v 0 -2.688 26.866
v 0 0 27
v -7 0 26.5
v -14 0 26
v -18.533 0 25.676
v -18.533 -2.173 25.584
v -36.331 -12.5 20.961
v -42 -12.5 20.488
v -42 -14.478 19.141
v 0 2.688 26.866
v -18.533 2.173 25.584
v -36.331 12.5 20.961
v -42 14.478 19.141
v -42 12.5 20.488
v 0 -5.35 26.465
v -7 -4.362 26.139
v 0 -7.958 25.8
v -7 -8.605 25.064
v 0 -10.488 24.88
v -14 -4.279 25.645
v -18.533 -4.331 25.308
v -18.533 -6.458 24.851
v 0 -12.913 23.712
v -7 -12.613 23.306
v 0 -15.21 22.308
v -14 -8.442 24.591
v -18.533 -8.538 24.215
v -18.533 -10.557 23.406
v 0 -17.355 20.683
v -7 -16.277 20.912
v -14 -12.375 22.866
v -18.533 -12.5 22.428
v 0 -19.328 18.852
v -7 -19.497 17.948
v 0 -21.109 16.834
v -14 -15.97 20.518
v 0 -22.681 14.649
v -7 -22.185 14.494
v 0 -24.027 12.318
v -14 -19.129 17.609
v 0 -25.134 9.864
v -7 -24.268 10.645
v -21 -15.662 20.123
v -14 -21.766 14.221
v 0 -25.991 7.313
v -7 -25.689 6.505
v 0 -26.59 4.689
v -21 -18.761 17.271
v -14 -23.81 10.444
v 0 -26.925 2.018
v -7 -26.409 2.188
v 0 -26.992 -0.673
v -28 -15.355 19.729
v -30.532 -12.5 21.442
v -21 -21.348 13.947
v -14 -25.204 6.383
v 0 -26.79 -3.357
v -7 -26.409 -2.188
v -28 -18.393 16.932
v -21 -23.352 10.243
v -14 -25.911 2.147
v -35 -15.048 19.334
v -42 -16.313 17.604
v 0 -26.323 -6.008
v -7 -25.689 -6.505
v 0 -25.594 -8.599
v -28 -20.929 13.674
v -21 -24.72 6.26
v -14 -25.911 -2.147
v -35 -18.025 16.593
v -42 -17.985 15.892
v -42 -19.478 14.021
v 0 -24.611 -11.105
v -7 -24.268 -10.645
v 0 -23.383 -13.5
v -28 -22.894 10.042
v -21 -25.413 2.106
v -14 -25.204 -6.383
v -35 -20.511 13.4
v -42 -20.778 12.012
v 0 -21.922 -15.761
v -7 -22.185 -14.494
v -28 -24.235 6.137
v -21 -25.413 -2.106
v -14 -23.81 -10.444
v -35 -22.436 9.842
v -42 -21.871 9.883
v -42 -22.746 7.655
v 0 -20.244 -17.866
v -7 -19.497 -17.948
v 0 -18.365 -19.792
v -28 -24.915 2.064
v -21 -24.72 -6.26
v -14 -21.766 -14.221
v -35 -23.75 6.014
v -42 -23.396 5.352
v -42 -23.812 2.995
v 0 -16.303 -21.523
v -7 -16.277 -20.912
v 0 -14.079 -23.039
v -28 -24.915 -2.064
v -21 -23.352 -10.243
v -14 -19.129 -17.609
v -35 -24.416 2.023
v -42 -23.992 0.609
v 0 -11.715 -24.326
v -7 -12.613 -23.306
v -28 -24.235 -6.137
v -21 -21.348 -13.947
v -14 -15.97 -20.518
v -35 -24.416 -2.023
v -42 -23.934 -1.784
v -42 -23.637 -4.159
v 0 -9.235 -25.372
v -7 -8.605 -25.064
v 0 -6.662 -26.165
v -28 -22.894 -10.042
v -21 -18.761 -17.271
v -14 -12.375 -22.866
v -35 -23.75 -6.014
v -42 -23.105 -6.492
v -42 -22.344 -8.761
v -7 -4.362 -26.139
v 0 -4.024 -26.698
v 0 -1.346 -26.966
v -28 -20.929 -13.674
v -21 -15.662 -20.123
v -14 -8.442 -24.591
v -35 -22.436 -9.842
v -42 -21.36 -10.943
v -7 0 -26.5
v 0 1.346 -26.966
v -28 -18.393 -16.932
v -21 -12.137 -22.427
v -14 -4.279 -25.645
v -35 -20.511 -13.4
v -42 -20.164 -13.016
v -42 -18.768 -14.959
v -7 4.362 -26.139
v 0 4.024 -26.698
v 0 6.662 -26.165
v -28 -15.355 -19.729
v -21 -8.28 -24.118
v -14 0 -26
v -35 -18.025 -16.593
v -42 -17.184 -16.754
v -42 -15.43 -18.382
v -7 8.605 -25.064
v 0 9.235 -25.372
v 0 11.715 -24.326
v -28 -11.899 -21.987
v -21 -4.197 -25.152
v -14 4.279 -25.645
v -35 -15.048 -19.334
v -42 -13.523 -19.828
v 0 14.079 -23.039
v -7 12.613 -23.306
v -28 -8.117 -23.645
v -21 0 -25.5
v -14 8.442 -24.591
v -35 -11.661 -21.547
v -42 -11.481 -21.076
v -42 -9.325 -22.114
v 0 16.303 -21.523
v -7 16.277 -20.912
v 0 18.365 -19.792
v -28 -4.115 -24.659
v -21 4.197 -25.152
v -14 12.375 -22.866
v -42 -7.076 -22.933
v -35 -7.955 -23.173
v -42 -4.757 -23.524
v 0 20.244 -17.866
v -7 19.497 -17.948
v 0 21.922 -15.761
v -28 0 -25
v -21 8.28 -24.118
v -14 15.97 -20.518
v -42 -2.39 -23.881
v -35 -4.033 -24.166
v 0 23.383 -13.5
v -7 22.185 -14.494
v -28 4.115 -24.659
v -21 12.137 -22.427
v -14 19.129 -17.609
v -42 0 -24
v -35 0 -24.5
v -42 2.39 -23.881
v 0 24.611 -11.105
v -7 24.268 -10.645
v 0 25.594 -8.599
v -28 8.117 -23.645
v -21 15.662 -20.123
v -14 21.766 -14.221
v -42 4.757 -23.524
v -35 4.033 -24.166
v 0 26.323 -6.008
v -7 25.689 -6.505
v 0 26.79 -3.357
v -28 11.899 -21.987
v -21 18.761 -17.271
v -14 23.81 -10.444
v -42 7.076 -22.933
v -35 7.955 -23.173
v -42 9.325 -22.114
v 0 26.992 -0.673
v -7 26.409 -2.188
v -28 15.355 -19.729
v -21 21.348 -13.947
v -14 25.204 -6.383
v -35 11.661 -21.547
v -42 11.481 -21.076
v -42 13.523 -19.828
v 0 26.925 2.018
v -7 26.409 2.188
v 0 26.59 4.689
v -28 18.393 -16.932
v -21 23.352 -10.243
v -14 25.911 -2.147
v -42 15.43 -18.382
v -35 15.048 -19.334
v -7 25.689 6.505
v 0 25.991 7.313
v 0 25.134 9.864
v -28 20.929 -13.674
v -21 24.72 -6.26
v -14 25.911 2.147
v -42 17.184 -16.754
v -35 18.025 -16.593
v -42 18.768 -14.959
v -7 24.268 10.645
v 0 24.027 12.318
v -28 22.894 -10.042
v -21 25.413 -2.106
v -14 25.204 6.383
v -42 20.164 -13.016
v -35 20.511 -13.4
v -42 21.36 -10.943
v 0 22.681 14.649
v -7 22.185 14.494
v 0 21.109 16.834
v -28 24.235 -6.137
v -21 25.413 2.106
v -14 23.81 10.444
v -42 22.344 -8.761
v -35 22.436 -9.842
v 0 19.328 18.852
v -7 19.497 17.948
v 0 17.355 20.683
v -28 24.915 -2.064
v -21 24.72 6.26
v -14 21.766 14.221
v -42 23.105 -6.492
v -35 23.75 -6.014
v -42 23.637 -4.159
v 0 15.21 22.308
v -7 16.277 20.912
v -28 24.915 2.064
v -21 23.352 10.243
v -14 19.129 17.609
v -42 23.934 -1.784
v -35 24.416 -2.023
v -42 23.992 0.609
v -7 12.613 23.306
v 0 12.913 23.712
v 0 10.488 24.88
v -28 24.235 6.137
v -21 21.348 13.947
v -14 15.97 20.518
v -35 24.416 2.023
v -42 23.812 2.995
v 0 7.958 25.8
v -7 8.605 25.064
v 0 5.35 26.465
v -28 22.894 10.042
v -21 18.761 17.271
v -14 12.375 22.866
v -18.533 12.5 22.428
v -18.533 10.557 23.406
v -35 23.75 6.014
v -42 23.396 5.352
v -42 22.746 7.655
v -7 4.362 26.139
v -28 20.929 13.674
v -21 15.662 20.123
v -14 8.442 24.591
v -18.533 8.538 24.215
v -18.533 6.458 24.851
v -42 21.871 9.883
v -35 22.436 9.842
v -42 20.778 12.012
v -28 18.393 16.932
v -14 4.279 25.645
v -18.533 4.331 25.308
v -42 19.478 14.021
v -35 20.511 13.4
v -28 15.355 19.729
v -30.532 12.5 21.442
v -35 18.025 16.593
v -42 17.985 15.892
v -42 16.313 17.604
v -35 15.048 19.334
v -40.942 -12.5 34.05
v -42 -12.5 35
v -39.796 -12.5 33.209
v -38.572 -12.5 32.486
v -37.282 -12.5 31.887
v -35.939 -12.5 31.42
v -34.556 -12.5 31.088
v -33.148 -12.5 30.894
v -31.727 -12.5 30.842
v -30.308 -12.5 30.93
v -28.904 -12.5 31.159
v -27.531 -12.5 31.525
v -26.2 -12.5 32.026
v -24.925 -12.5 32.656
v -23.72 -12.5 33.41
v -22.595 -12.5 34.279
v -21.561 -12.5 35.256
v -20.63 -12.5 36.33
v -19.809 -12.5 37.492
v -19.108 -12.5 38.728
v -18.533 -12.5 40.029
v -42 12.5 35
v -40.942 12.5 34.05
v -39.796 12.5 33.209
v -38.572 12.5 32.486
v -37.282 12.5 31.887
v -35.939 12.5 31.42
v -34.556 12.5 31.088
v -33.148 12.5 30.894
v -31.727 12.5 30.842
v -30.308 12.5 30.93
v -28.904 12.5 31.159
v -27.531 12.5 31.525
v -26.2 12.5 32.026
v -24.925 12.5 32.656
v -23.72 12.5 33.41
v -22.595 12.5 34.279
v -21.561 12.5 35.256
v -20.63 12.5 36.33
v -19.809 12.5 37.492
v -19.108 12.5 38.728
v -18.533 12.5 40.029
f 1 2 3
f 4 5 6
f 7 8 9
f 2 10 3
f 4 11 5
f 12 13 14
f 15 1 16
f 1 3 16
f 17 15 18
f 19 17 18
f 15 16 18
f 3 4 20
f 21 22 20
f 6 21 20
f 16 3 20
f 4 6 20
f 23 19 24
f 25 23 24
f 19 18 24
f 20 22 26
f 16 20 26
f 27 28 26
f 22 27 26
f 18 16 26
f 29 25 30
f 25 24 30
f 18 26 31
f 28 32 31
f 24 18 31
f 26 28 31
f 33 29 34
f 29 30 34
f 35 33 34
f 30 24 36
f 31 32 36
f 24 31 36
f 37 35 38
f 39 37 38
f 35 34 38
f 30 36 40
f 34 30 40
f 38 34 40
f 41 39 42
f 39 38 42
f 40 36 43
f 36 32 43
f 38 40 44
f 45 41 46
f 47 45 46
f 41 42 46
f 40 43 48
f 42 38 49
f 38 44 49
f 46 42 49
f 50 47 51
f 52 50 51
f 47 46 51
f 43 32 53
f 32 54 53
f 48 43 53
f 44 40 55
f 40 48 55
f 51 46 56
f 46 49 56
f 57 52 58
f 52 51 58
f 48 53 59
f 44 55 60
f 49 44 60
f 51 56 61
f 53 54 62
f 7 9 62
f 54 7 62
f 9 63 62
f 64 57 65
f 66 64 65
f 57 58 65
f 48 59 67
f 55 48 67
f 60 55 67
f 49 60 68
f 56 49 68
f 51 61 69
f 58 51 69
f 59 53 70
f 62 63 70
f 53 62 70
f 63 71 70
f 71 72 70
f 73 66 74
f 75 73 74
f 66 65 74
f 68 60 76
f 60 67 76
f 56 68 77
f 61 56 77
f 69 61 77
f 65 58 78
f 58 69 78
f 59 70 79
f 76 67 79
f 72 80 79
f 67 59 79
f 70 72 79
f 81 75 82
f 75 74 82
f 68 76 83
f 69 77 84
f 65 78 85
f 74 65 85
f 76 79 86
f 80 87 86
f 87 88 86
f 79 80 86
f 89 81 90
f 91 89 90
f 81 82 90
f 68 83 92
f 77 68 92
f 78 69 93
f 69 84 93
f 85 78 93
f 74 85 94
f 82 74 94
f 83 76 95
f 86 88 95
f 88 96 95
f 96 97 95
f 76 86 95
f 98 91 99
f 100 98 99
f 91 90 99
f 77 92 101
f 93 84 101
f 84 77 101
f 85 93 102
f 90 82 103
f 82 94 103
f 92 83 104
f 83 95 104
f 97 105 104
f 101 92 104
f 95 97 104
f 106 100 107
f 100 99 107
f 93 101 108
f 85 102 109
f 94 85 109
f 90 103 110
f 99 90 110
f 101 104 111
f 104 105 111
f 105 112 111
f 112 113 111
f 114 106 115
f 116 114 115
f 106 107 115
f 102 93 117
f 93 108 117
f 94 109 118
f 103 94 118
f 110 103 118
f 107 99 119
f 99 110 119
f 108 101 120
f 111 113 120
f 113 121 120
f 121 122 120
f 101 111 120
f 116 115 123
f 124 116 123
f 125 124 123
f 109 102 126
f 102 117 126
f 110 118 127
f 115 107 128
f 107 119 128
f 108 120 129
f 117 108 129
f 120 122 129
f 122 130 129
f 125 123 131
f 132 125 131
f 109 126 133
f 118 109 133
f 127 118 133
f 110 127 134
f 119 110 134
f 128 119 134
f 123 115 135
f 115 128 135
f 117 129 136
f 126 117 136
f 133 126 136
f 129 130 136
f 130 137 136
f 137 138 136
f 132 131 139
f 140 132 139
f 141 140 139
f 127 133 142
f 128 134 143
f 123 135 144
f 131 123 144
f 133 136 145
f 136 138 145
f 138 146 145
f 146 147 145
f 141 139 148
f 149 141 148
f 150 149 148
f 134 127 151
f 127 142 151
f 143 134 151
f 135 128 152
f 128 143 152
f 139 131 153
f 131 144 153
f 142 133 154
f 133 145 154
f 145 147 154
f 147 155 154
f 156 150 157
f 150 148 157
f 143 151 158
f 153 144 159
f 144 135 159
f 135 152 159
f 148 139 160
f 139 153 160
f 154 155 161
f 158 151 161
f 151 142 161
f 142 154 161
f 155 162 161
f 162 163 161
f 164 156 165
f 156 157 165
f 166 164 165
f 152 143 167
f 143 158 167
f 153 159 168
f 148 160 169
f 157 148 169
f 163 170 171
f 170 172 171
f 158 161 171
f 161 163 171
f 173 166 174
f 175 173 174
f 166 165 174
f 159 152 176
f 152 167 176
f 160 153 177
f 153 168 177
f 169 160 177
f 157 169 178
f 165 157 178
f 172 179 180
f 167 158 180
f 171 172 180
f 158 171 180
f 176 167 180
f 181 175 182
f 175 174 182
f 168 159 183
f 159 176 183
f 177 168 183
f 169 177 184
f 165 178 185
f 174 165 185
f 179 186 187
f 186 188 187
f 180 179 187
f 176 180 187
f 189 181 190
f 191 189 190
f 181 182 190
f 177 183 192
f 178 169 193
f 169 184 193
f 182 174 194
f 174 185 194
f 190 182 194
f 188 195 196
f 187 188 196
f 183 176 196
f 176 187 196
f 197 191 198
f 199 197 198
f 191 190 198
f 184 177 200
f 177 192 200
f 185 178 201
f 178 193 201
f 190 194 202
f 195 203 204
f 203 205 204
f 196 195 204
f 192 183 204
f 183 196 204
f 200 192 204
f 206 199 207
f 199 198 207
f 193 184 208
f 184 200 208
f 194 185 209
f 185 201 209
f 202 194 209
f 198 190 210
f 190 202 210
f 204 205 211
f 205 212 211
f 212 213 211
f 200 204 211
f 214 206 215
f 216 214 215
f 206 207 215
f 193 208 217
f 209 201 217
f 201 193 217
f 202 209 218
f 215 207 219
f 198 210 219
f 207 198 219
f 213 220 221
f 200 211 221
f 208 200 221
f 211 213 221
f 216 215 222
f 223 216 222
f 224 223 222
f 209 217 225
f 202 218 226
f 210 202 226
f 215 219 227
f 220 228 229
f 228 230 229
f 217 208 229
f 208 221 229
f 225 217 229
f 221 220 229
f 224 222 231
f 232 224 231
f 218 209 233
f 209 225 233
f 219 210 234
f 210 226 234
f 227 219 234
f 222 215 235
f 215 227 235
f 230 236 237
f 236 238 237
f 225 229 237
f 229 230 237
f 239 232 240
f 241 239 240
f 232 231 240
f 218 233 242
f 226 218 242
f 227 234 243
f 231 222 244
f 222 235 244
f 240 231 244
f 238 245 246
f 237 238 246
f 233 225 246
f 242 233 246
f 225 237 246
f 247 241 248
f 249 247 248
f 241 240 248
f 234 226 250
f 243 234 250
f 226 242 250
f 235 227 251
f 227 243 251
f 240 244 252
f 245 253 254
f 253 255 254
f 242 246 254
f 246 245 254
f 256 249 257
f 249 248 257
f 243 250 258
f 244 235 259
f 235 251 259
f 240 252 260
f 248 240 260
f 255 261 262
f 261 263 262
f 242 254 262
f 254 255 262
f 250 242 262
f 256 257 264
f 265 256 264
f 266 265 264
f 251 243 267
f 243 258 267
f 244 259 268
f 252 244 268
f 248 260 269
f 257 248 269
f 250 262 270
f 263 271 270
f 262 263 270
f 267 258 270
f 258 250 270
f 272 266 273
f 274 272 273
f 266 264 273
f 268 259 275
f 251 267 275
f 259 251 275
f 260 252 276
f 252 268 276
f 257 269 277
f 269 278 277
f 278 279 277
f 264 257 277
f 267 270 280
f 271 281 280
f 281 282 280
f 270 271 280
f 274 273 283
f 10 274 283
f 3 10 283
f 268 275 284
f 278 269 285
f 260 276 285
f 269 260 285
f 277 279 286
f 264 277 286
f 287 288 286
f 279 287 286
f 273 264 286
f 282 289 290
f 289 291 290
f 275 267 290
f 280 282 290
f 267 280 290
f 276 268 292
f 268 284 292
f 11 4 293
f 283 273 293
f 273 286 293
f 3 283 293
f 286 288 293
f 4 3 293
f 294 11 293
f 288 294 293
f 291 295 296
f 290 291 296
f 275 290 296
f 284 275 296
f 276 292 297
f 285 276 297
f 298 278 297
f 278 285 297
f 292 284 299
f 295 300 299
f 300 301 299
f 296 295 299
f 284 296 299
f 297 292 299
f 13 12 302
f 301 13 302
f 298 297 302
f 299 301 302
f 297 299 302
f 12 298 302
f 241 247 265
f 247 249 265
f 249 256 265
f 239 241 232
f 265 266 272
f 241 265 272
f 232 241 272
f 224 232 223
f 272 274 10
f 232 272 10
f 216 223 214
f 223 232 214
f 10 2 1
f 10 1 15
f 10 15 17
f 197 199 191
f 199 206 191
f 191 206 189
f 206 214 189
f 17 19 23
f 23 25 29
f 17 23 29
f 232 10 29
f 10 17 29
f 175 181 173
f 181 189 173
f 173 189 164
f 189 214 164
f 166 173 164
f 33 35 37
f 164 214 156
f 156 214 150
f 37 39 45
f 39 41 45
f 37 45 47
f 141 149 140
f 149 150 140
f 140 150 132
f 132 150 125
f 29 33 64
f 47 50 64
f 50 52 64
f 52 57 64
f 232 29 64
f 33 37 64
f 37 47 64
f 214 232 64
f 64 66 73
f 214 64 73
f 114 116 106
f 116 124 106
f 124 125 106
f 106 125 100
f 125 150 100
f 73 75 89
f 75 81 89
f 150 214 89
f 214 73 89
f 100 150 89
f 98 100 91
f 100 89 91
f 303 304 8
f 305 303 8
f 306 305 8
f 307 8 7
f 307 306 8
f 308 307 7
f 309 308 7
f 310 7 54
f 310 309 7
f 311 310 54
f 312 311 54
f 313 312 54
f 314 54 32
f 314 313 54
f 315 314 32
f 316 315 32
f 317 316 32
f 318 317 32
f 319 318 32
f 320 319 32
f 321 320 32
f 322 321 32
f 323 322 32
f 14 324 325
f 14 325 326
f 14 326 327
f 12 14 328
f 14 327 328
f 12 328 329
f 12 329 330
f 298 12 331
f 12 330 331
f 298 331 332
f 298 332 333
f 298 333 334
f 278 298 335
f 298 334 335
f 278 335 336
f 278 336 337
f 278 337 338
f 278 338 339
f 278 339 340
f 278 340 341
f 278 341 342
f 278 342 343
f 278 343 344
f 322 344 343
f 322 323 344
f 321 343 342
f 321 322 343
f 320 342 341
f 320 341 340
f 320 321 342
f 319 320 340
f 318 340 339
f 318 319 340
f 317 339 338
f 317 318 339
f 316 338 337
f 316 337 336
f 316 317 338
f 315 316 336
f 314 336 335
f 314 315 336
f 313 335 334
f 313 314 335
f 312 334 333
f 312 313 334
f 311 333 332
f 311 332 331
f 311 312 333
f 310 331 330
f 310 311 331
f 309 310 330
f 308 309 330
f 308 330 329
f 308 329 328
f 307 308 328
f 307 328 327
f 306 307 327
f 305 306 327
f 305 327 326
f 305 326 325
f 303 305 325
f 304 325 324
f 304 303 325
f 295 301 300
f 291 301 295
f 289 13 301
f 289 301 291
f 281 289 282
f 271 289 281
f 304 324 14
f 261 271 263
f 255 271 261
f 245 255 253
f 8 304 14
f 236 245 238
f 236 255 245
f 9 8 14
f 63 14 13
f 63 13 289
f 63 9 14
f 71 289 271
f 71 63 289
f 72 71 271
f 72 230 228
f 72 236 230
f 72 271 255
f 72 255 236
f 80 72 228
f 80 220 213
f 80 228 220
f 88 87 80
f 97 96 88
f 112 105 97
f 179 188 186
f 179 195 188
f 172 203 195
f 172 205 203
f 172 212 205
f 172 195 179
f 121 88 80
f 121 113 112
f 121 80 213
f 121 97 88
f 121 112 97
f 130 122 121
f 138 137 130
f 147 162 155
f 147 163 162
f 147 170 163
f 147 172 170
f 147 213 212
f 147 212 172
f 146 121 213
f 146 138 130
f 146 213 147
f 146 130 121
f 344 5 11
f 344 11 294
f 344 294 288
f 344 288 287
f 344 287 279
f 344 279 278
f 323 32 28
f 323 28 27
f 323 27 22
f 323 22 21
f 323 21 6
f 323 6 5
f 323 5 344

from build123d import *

# Parameters (mm, degrees)
F3_DEPTH = 12.5


with BuildPart() as f1:
    # F0 (on Front) → F1 (revolve)
    with BuildSketch(Plane.XZ):
        Polygon((0, 0), (0, 27), (-42, 24), (-42, 0), align=None)
    revolve(axis=Axis((-21, 0, 0), (1, 0, 0)))

    # F2 (on Front) → F3 (join, symmetric)
    with BuildSketch(Plane.XZ):
        with BuildLine():
            ThreePointArc((-18.532742, 40.028698), (-28.904432, 31.158633), (-42, 35))
            Line((-42, 35), (-42, 0))
            Line((-42, 0), (-18.532742, 0))
            Line((-18.532742, 0), (-18.532742, 40.028698))
        make_face()
    extrude(amount=F3_DEPTH, both=True)


solid = f1.part
